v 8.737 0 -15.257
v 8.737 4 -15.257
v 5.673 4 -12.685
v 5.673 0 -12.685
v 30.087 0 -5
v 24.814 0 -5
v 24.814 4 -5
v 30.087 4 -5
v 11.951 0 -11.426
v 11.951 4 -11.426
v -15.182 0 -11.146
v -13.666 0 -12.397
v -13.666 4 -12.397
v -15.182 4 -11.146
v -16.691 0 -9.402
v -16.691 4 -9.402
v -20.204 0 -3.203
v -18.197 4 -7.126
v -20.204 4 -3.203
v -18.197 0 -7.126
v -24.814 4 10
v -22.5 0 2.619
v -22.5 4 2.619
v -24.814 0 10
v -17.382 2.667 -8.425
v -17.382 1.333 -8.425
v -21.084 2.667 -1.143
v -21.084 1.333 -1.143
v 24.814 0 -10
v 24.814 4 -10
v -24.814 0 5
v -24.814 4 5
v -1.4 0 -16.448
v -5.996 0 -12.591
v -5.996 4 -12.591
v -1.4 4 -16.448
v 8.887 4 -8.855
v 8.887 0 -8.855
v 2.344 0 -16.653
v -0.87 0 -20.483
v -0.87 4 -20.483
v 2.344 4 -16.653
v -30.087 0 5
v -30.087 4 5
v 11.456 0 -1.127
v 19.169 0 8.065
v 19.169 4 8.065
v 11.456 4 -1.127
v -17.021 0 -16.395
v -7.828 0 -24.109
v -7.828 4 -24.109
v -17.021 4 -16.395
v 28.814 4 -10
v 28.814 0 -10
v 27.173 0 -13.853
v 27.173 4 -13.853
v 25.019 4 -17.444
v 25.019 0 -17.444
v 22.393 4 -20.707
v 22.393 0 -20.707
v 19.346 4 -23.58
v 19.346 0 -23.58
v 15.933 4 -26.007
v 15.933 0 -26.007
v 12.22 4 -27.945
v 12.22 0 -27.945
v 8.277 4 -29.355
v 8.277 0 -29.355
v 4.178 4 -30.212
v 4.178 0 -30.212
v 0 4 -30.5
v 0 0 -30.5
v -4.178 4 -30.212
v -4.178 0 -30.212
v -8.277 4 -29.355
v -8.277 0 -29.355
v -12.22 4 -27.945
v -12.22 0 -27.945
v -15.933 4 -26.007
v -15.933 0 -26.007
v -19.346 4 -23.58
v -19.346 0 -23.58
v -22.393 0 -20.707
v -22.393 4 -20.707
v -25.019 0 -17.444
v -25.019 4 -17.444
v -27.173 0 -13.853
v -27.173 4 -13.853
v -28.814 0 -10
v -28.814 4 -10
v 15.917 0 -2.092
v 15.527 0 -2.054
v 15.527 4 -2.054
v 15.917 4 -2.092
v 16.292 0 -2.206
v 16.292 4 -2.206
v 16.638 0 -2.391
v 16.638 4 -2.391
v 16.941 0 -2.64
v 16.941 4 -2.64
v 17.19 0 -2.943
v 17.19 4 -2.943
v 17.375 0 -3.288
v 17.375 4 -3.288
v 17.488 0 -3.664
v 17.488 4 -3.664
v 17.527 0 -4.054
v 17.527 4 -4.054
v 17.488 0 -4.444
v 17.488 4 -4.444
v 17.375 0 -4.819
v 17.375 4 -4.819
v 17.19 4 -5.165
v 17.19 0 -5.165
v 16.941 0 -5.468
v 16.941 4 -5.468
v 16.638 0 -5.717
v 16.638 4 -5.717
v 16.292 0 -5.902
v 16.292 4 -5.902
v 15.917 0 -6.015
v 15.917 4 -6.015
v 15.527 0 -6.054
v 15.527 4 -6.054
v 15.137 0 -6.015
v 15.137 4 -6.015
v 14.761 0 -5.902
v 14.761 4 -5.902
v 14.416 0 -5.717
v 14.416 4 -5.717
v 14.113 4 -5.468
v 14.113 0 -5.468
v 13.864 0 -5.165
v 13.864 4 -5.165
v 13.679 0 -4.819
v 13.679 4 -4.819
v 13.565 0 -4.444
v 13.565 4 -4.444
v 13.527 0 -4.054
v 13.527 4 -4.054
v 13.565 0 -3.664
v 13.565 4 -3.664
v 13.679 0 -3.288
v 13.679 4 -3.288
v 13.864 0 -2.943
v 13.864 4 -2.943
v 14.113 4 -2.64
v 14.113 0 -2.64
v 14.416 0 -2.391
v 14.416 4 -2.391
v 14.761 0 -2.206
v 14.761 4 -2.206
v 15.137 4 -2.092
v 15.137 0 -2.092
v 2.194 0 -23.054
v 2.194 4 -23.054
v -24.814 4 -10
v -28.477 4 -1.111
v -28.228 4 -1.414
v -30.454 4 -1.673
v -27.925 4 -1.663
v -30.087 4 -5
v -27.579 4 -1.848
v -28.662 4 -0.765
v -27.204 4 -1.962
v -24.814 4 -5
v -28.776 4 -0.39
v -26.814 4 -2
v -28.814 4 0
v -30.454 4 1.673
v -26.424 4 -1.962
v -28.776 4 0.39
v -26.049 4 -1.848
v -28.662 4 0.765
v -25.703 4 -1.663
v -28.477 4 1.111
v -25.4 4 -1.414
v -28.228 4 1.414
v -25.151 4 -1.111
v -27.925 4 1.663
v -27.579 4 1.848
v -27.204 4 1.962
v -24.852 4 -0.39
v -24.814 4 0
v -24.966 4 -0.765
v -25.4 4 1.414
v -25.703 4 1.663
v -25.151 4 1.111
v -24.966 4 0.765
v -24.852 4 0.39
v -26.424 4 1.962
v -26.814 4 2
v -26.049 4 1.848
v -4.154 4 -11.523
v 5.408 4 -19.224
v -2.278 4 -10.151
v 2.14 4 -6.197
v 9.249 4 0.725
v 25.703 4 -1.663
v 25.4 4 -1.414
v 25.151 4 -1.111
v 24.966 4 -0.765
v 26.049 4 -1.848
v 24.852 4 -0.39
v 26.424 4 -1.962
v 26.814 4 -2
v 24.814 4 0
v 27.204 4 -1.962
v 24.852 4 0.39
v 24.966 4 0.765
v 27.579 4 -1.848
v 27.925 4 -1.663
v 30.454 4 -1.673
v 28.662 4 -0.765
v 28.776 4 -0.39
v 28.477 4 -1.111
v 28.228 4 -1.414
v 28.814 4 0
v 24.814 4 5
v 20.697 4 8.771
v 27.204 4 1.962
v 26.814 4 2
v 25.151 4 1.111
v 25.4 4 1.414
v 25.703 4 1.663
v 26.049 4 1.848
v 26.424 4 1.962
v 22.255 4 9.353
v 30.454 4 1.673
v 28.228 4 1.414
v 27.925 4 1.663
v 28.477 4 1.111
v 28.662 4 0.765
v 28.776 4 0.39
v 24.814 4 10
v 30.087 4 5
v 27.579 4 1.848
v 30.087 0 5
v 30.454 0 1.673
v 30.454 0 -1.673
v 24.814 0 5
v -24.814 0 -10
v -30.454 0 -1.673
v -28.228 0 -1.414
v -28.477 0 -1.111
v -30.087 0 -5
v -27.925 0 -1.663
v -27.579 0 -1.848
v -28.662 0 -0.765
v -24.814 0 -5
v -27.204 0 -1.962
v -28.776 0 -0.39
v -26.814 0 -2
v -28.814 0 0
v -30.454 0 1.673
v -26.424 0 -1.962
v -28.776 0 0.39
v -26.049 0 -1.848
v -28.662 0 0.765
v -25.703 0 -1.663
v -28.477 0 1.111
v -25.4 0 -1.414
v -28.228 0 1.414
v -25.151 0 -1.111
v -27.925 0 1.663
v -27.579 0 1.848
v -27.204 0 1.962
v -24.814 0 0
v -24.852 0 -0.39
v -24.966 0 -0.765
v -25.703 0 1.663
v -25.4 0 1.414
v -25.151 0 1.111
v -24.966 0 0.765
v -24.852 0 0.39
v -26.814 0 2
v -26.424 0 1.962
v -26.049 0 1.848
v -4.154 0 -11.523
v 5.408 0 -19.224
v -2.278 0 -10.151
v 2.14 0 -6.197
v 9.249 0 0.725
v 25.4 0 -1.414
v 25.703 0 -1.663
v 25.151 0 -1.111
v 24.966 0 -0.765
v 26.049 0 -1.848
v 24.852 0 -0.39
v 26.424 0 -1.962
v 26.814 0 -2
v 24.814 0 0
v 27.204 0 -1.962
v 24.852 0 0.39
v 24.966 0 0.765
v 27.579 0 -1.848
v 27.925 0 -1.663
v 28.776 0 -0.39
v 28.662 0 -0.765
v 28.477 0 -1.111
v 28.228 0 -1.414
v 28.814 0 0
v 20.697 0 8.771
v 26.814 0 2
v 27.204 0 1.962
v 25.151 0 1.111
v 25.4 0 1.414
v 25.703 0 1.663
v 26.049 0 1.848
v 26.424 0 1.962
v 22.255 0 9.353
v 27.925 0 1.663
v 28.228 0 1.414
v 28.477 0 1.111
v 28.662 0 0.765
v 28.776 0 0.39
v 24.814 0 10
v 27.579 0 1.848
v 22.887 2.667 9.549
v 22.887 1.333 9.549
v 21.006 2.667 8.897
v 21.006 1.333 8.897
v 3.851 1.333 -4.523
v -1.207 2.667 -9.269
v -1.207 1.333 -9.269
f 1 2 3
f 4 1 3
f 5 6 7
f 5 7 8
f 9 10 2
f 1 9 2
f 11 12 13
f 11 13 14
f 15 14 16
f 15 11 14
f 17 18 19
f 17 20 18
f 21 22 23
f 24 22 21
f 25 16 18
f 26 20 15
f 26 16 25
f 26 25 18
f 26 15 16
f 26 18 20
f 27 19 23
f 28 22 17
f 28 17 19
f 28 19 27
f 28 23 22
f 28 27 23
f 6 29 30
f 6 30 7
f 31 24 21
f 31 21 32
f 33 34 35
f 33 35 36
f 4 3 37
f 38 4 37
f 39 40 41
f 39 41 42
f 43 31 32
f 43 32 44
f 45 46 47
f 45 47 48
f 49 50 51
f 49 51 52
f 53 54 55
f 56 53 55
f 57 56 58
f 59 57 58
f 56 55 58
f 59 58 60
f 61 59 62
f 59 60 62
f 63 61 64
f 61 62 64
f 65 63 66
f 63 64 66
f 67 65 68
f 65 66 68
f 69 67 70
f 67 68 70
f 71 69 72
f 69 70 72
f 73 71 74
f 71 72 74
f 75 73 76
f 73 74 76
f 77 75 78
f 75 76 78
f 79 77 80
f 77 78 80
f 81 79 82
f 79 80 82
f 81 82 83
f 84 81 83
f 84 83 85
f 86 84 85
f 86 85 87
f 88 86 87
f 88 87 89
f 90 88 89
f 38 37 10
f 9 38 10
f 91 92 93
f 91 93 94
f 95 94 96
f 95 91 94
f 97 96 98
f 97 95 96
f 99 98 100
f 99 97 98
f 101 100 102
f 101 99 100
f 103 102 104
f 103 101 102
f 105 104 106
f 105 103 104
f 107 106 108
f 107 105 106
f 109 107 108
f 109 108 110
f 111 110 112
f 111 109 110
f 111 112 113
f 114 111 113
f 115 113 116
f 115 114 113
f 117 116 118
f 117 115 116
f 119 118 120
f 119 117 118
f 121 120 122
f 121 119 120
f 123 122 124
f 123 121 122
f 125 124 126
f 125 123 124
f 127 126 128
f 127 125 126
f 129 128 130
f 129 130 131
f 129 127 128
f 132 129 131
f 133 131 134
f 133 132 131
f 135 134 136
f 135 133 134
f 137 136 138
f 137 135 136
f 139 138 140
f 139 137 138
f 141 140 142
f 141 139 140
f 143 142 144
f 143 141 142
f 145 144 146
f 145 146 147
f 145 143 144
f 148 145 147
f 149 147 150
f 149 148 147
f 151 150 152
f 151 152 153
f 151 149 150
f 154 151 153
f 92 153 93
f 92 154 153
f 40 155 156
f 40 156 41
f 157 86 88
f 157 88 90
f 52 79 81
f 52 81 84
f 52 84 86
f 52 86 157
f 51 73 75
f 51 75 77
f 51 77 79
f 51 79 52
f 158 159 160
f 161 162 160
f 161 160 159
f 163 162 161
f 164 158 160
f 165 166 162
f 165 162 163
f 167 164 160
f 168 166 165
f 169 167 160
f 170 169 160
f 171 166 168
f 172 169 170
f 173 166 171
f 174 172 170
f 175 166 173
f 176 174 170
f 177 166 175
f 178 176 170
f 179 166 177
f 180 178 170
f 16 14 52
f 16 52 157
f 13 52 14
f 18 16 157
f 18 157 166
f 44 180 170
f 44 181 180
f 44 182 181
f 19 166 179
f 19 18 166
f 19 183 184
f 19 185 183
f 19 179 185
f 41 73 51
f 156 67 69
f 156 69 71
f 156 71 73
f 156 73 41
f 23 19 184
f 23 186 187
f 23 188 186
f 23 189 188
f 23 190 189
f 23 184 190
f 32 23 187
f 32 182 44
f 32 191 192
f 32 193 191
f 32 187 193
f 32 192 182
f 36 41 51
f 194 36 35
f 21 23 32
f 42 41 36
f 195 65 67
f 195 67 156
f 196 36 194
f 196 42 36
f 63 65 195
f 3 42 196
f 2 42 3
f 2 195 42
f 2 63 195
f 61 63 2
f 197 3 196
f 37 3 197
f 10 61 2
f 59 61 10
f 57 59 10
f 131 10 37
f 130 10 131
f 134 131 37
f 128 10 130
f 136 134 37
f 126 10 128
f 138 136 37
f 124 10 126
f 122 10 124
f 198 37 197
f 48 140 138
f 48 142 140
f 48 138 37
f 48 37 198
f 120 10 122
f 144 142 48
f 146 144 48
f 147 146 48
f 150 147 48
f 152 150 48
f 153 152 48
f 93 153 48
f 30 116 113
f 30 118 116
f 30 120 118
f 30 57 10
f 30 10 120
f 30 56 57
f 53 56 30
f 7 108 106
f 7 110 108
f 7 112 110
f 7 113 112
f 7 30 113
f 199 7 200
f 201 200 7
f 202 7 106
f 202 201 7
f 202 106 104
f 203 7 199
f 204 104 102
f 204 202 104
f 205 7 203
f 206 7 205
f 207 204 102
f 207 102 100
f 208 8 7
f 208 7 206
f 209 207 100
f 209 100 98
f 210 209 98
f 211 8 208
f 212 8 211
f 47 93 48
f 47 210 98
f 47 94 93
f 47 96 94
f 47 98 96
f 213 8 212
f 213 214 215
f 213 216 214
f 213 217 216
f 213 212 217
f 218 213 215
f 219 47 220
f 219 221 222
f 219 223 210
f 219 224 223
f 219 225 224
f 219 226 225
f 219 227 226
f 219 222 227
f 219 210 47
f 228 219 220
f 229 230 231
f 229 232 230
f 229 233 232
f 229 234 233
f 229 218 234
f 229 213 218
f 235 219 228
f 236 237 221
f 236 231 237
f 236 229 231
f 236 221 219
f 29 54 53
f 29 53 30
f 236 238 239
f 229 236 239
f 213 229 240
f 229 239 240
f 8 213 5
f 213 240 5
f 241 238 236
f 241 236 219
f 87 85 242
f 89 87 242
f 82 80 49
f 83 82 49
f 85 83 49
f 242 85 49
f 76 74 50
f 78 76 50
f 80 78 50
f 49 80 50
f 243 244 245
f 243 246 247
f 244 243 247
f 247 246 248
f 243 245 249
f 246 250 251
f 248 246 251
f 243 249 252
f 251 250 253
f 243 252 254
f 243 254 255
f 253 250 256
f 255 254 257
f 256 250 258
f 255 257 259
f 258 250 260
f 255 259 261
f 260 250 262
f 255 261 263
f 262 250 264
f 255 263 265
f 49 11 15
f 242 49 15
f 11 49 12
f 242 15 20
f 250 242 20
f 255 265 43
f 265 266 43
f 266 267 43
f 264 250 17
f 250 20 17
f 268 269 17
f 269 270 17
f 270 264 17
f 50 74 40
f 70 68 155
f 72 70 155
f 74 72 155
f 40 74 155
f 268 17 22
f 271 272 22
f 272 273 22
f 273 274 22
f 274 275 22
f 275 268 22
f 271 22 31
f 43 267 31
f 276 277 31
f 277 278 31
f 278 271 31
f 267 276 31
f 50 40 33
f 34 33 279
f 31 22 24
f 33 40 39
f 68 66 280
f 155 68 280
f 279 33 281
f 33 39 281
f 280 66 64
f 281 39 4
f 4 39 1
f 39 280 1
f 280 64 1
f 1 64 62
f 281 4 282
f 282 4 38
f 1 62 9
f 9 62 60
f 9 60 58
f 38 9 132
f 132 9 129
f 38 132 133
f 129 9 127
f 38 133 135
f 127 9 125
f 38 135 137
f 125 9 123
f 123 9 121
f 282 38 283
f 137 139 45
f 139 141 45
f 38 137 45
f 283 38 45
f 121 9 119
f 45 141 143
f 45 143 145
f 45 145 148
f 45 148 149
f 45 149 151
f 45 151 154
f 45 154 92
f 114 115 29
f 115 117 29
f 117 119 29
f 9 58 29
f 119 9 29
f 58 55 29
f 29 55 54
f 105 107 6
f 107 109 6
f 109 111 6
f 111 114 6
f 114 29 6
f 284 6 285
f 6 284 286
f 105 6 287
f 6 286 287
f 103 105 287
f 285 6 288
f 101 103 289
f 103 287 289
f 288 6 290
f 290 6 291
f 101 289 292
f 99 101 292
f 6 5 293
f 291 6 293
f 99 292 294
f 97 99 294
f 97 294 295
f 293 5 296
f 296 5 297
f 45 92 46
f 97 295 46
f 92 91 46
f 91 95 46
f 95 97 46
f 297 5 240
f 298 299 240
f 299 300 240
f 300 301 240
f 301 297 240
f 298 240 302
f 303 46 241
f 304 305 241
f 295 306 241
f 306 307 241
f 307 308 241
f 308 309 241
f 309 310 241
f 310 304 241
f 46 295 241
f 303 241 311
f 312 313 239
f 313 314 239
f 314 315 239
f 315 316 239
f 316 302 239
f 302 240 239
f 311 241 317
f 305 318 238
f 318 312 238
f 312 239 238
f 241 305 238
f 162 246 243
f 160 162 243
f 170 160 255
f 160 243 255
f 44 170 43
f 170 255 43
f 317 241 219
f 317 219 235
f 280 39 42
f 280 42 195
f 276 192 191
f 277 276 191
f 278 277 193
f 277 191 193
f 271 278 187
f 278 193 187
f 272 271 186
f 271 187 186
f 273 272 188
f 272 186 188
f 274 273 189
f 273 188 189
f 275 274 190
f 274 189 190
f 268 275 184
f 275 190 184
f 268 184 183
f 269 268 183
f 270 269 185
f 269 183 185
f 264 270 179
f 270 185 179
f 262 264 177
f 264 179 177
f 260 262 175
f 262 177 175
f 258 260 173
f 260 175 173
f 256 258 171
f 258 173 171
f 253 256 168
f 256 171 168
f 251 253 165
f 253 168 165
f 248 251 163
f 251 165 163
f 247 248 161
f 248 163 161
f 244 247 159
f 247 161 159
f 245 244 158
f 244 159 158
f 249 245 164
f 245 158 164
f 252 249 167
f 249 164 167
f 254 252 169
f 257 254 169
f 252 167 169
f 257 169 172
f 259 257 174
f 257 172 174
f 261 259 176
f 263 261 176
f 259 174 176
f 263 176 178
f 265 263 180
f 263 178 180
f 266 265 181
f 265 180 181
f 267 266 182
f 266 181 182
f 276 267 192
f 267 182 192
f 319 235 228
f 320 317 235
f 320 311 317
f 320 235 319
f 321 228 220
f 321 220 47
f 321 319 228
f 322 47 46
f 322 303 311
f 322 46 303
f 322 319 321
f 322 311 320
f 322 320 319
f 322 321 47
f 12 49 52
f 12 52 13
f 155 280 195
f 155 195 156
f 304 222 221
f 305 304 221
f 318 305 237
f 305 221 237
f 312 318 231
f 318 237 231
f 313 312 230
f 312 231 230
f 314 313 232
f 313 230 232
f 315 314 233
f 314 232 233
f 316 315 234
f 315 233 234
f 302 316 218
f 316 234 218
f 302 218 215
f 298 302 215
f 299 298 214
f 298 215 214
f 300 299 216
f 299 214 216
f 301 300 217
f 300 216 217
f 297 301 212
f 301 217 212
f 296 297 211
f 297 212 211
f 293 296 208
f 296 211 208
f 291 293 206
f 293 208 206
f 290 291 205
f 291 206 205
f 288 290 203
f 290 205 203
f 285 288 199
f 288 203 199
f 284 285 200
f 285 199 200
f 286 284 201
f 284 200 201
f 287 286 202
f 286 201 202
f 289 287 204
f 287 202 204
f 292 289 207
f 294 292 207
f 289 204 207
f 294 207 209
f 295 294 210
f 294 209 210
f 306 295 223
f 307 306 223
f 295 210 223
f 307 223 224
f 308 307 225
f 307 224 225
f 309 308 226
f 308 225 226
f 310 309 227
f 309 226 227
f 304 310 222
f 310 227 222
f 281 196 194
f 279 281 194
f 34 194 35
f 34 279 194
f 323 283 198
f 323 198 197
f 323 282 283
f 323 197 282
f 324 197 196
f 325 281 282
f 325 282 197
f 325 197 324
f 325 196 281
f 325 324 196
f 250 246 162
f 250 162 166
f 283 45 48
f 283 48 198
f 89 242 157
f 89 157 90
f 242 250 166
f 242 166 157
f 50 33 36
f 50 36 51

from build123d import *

# Parameters (mm, degrees)
CROQUIS1_R              = 30.5
SALIENTE_EXTRUIR1_DEPTH = 4
CROQUIS2_R              = 2
CORTAR_EXTRUIR1_DEPTH   = 4
CORTAR_EXTRUIR3_START   = -4
CORTAR_EXTRUIR3_DEPTH   = 4
CORTAR_EXTRUIR5_START   = -4
CROQUIS7_R              = 2
CORTAR_EXTRUIR5_DEPTH   = 4
CORTAR_EXTRUIR6_DEPTH   = 10
CROQUIS10_R             = 2
CORTAR_EXTRUIR7_DEPTH   = 4


with BuildPart() as part:
    # Croquis1 → Saliente-Extruir1 (new body)
    with BuildSketch(Plane(origin=(0, 0, 0), x_dir=(1, 0, 0), z_dir=(0, 1, 0))):
        with Locations(Location((0, 0, 0), (0, 0, 270))):
            Circle(CROQUIS1_R)
    extrude(amount=SALIENTE_EXTRUIR1_DEPTH)

    # Croquis2 → Cortar-Extruir1 (cut)
    with BuildSketch(Plane(origin=(0, 4, 0), x_dir=(1, 0, 0), z_dir=(0, 1, 0))):
        with Locations(Location((0, 0, 0), (0, 0, 270))):
            Circle(CROQUIS2_R)
    extrude(amount=-CORTAR_EXTRUIR1_DEPTH, mode=Mode.SUBTRACT)

    # Croquis5 → Cortar-Extruir3 (cut)
    with BuildSketch(Plane(origin=(0, 4, 0), x_dir=(1, 0, 0), z_dir=(0, 1, 0)).offset(CORTAR_EXTRUIR3_START)):
        with BuildLine():
            Line((28.814059068, 5), (30.087372767, 5))
            ThreePointArc((30.087372767, 5), (29.556634924, 7.526973624), (28.814059068, 10))
            Line((28.814059068, 10), (24.814059068, 10))
            Line((24.814059068, 10), (24.814059068, 5))
            Line((24.814059068, 5), (28.814059068, 5))
        make_face()
        with BuildLine():
            Line((30.087372767, -5), (28.814059068, -5))
            Line((28.814059068, -5), (24.814059068, -5))
            Line((24.814059068, -5), (24.814059068, -10))
            Line((24.814059068, -10), (28.814059068, -10))
            ThreePointArc((28.814059068, -10), (29.556634924, -7.526973624), (30.087372767, -5))
        make_face()
        with BuildLine():
            Line((-24.814059068, 5), (-24.814059068, 10))
            Line((-24.814059068, 10), (-28.814059068, 10))
            ThreePointArc((-28.814059068, 10), (-29.556634924, 7.526973624), (-30.087372767, 5))
            Line((-30.087372767, 5), (-28.814059068, 5))
            Line((-28.814059068, 5), (-24.814059068, 5))
        make_face()
        with BuildLine():
            Line((-28.814059068, -10), (-24.814059068, -10))
            Line((-24.814059068, -10), (-24.814059068, -5))
            Line((-24.814059068, -5), (-28.814059068, -5))
            Line((-28.814059068, -5), (-30.087372767, -5))
            ThreePointArc((-30.087372767, -5), (-29.556634924, -7.526973624), (-28.814059068, -10))
        make_face()
    extrude(amount=CORTAR_EXTRUIR3_DEPTH, mode=Mode.SUBTRACT)

    # Croquis7 → Cortar-Extruir5 (cut)
    with BuildSketch(Plane(origin=(0, 4, 0), x_dir=(1, 0, 0), z_dir=(0, 1, 0)).offset(CORTAR_EXTRUIR5_START)):
        with Locations(Location((15.526809242, 4.053864794, 0), (0, 0, 270))):
            Circle(CROQUIS7_R)
        Polygon((2.194434654, 23.054217761), (-0.869743118, 20.483067322), (2.34419493, 16.652845106), (5.408372702, 19.223995545), align=None)
        with BuildLine():
            Line((-24.814059068, -10), (-28.814059068, -10))
            ThreePointArc((-28.814059068, -10), (0, -30.5), (28.814059068, -10))
            Line((28.814059068, -10), (24.814059068, -10))
            add(Edge.make_bspline(
                [(24.814059068, -10), (22.863263717, -9.657344338), (20.984021298, -8.980450277), (19.168992989, -8.065339906)],
                knots=[0, 0, 0, 0, 0.087850084, 0.087850084, 0.087850084, 0.087850084], degree=3))
            Line((19.168992989, -8.065339906), (11.455541673, 1.127193412))
            Line((11.455541673, 1.127193412), (9.248678515, -0.72458465))
            add(Edge.make_bspline(
                [(9.248678515, -0.72458465), (3.657558626, 4.465361799), (-1.318373357, 10.288134416), (-5.99647718, 12.591356616)],
                knots=[0.258799312, 0.258799312, 0.258799312, 0.258799312, 0.567154107, 0.567154107, 0.567154107, 0.567154107], degree=3))
            Line((-5.99647718, 12.591356616), (-1.400210521, 16.448082274))
            Line((-1.400210521, 16.448082274), (-7.828086618, 24.108526705))
            Line((-7.828086618, 24.108526705), (-17.020619935, 16.395075389))
            Line((-17.020619935, 16.395075389), (-13.66601447, 12.397212273))
            add(Edge.make_bspline(
                [(-13.66601447, 12.397212273), (-17.403465693, 9.897923685), (-21.056529869, 3.255841362), (-24.814059068, -10)],
                knots=[0.740637404, 0.740637404, 0.740637404, 0.740637404, 1, 1, 1, 1], degree=3))
        make_face()
    extrude(amount=CORTAR_EXTRUIR5_DEPTH, mode=Mode.SUBTRACT)

    # Croquis9 → Cortar-Extruir6 (cut)
    with BuildSketch(Plane(origin=(0, 4, 0), x_dir=(1, 0, 0), z_dir=(0, 1, 0))):
        Polygon((8.737462625, 15.25654067), (5.673284852, 12.685390231), (8.887222901, 8.855168016), (11.951400673, 11.426318455), align=None)
    extrude(amount=-CORTAR_EXTRUIR6_DEPTH, mode=Mode.SUBTRACT)

    # Croquis10 → Cortar-Extruir7 (cut)
    with BuildSketch(Plane(origin=(0, 4, 0), x_dir=(1, 0, 0), z_dir=(0, 1, 0))):
        with Locations(Location((-26.814059068, 0, 0), (0, 0, 270))):
            Circle(CROQUIS10_R)
        with Locations(Location((26.814059068, 0, 0), (0, 0, 270))):
            Circle(CROQUIS10_R)
    extrude(amount=-CORTAR_EXTRUIR7_DEPTH, mode=Mode.SUBTRACT)


solid = part.part
